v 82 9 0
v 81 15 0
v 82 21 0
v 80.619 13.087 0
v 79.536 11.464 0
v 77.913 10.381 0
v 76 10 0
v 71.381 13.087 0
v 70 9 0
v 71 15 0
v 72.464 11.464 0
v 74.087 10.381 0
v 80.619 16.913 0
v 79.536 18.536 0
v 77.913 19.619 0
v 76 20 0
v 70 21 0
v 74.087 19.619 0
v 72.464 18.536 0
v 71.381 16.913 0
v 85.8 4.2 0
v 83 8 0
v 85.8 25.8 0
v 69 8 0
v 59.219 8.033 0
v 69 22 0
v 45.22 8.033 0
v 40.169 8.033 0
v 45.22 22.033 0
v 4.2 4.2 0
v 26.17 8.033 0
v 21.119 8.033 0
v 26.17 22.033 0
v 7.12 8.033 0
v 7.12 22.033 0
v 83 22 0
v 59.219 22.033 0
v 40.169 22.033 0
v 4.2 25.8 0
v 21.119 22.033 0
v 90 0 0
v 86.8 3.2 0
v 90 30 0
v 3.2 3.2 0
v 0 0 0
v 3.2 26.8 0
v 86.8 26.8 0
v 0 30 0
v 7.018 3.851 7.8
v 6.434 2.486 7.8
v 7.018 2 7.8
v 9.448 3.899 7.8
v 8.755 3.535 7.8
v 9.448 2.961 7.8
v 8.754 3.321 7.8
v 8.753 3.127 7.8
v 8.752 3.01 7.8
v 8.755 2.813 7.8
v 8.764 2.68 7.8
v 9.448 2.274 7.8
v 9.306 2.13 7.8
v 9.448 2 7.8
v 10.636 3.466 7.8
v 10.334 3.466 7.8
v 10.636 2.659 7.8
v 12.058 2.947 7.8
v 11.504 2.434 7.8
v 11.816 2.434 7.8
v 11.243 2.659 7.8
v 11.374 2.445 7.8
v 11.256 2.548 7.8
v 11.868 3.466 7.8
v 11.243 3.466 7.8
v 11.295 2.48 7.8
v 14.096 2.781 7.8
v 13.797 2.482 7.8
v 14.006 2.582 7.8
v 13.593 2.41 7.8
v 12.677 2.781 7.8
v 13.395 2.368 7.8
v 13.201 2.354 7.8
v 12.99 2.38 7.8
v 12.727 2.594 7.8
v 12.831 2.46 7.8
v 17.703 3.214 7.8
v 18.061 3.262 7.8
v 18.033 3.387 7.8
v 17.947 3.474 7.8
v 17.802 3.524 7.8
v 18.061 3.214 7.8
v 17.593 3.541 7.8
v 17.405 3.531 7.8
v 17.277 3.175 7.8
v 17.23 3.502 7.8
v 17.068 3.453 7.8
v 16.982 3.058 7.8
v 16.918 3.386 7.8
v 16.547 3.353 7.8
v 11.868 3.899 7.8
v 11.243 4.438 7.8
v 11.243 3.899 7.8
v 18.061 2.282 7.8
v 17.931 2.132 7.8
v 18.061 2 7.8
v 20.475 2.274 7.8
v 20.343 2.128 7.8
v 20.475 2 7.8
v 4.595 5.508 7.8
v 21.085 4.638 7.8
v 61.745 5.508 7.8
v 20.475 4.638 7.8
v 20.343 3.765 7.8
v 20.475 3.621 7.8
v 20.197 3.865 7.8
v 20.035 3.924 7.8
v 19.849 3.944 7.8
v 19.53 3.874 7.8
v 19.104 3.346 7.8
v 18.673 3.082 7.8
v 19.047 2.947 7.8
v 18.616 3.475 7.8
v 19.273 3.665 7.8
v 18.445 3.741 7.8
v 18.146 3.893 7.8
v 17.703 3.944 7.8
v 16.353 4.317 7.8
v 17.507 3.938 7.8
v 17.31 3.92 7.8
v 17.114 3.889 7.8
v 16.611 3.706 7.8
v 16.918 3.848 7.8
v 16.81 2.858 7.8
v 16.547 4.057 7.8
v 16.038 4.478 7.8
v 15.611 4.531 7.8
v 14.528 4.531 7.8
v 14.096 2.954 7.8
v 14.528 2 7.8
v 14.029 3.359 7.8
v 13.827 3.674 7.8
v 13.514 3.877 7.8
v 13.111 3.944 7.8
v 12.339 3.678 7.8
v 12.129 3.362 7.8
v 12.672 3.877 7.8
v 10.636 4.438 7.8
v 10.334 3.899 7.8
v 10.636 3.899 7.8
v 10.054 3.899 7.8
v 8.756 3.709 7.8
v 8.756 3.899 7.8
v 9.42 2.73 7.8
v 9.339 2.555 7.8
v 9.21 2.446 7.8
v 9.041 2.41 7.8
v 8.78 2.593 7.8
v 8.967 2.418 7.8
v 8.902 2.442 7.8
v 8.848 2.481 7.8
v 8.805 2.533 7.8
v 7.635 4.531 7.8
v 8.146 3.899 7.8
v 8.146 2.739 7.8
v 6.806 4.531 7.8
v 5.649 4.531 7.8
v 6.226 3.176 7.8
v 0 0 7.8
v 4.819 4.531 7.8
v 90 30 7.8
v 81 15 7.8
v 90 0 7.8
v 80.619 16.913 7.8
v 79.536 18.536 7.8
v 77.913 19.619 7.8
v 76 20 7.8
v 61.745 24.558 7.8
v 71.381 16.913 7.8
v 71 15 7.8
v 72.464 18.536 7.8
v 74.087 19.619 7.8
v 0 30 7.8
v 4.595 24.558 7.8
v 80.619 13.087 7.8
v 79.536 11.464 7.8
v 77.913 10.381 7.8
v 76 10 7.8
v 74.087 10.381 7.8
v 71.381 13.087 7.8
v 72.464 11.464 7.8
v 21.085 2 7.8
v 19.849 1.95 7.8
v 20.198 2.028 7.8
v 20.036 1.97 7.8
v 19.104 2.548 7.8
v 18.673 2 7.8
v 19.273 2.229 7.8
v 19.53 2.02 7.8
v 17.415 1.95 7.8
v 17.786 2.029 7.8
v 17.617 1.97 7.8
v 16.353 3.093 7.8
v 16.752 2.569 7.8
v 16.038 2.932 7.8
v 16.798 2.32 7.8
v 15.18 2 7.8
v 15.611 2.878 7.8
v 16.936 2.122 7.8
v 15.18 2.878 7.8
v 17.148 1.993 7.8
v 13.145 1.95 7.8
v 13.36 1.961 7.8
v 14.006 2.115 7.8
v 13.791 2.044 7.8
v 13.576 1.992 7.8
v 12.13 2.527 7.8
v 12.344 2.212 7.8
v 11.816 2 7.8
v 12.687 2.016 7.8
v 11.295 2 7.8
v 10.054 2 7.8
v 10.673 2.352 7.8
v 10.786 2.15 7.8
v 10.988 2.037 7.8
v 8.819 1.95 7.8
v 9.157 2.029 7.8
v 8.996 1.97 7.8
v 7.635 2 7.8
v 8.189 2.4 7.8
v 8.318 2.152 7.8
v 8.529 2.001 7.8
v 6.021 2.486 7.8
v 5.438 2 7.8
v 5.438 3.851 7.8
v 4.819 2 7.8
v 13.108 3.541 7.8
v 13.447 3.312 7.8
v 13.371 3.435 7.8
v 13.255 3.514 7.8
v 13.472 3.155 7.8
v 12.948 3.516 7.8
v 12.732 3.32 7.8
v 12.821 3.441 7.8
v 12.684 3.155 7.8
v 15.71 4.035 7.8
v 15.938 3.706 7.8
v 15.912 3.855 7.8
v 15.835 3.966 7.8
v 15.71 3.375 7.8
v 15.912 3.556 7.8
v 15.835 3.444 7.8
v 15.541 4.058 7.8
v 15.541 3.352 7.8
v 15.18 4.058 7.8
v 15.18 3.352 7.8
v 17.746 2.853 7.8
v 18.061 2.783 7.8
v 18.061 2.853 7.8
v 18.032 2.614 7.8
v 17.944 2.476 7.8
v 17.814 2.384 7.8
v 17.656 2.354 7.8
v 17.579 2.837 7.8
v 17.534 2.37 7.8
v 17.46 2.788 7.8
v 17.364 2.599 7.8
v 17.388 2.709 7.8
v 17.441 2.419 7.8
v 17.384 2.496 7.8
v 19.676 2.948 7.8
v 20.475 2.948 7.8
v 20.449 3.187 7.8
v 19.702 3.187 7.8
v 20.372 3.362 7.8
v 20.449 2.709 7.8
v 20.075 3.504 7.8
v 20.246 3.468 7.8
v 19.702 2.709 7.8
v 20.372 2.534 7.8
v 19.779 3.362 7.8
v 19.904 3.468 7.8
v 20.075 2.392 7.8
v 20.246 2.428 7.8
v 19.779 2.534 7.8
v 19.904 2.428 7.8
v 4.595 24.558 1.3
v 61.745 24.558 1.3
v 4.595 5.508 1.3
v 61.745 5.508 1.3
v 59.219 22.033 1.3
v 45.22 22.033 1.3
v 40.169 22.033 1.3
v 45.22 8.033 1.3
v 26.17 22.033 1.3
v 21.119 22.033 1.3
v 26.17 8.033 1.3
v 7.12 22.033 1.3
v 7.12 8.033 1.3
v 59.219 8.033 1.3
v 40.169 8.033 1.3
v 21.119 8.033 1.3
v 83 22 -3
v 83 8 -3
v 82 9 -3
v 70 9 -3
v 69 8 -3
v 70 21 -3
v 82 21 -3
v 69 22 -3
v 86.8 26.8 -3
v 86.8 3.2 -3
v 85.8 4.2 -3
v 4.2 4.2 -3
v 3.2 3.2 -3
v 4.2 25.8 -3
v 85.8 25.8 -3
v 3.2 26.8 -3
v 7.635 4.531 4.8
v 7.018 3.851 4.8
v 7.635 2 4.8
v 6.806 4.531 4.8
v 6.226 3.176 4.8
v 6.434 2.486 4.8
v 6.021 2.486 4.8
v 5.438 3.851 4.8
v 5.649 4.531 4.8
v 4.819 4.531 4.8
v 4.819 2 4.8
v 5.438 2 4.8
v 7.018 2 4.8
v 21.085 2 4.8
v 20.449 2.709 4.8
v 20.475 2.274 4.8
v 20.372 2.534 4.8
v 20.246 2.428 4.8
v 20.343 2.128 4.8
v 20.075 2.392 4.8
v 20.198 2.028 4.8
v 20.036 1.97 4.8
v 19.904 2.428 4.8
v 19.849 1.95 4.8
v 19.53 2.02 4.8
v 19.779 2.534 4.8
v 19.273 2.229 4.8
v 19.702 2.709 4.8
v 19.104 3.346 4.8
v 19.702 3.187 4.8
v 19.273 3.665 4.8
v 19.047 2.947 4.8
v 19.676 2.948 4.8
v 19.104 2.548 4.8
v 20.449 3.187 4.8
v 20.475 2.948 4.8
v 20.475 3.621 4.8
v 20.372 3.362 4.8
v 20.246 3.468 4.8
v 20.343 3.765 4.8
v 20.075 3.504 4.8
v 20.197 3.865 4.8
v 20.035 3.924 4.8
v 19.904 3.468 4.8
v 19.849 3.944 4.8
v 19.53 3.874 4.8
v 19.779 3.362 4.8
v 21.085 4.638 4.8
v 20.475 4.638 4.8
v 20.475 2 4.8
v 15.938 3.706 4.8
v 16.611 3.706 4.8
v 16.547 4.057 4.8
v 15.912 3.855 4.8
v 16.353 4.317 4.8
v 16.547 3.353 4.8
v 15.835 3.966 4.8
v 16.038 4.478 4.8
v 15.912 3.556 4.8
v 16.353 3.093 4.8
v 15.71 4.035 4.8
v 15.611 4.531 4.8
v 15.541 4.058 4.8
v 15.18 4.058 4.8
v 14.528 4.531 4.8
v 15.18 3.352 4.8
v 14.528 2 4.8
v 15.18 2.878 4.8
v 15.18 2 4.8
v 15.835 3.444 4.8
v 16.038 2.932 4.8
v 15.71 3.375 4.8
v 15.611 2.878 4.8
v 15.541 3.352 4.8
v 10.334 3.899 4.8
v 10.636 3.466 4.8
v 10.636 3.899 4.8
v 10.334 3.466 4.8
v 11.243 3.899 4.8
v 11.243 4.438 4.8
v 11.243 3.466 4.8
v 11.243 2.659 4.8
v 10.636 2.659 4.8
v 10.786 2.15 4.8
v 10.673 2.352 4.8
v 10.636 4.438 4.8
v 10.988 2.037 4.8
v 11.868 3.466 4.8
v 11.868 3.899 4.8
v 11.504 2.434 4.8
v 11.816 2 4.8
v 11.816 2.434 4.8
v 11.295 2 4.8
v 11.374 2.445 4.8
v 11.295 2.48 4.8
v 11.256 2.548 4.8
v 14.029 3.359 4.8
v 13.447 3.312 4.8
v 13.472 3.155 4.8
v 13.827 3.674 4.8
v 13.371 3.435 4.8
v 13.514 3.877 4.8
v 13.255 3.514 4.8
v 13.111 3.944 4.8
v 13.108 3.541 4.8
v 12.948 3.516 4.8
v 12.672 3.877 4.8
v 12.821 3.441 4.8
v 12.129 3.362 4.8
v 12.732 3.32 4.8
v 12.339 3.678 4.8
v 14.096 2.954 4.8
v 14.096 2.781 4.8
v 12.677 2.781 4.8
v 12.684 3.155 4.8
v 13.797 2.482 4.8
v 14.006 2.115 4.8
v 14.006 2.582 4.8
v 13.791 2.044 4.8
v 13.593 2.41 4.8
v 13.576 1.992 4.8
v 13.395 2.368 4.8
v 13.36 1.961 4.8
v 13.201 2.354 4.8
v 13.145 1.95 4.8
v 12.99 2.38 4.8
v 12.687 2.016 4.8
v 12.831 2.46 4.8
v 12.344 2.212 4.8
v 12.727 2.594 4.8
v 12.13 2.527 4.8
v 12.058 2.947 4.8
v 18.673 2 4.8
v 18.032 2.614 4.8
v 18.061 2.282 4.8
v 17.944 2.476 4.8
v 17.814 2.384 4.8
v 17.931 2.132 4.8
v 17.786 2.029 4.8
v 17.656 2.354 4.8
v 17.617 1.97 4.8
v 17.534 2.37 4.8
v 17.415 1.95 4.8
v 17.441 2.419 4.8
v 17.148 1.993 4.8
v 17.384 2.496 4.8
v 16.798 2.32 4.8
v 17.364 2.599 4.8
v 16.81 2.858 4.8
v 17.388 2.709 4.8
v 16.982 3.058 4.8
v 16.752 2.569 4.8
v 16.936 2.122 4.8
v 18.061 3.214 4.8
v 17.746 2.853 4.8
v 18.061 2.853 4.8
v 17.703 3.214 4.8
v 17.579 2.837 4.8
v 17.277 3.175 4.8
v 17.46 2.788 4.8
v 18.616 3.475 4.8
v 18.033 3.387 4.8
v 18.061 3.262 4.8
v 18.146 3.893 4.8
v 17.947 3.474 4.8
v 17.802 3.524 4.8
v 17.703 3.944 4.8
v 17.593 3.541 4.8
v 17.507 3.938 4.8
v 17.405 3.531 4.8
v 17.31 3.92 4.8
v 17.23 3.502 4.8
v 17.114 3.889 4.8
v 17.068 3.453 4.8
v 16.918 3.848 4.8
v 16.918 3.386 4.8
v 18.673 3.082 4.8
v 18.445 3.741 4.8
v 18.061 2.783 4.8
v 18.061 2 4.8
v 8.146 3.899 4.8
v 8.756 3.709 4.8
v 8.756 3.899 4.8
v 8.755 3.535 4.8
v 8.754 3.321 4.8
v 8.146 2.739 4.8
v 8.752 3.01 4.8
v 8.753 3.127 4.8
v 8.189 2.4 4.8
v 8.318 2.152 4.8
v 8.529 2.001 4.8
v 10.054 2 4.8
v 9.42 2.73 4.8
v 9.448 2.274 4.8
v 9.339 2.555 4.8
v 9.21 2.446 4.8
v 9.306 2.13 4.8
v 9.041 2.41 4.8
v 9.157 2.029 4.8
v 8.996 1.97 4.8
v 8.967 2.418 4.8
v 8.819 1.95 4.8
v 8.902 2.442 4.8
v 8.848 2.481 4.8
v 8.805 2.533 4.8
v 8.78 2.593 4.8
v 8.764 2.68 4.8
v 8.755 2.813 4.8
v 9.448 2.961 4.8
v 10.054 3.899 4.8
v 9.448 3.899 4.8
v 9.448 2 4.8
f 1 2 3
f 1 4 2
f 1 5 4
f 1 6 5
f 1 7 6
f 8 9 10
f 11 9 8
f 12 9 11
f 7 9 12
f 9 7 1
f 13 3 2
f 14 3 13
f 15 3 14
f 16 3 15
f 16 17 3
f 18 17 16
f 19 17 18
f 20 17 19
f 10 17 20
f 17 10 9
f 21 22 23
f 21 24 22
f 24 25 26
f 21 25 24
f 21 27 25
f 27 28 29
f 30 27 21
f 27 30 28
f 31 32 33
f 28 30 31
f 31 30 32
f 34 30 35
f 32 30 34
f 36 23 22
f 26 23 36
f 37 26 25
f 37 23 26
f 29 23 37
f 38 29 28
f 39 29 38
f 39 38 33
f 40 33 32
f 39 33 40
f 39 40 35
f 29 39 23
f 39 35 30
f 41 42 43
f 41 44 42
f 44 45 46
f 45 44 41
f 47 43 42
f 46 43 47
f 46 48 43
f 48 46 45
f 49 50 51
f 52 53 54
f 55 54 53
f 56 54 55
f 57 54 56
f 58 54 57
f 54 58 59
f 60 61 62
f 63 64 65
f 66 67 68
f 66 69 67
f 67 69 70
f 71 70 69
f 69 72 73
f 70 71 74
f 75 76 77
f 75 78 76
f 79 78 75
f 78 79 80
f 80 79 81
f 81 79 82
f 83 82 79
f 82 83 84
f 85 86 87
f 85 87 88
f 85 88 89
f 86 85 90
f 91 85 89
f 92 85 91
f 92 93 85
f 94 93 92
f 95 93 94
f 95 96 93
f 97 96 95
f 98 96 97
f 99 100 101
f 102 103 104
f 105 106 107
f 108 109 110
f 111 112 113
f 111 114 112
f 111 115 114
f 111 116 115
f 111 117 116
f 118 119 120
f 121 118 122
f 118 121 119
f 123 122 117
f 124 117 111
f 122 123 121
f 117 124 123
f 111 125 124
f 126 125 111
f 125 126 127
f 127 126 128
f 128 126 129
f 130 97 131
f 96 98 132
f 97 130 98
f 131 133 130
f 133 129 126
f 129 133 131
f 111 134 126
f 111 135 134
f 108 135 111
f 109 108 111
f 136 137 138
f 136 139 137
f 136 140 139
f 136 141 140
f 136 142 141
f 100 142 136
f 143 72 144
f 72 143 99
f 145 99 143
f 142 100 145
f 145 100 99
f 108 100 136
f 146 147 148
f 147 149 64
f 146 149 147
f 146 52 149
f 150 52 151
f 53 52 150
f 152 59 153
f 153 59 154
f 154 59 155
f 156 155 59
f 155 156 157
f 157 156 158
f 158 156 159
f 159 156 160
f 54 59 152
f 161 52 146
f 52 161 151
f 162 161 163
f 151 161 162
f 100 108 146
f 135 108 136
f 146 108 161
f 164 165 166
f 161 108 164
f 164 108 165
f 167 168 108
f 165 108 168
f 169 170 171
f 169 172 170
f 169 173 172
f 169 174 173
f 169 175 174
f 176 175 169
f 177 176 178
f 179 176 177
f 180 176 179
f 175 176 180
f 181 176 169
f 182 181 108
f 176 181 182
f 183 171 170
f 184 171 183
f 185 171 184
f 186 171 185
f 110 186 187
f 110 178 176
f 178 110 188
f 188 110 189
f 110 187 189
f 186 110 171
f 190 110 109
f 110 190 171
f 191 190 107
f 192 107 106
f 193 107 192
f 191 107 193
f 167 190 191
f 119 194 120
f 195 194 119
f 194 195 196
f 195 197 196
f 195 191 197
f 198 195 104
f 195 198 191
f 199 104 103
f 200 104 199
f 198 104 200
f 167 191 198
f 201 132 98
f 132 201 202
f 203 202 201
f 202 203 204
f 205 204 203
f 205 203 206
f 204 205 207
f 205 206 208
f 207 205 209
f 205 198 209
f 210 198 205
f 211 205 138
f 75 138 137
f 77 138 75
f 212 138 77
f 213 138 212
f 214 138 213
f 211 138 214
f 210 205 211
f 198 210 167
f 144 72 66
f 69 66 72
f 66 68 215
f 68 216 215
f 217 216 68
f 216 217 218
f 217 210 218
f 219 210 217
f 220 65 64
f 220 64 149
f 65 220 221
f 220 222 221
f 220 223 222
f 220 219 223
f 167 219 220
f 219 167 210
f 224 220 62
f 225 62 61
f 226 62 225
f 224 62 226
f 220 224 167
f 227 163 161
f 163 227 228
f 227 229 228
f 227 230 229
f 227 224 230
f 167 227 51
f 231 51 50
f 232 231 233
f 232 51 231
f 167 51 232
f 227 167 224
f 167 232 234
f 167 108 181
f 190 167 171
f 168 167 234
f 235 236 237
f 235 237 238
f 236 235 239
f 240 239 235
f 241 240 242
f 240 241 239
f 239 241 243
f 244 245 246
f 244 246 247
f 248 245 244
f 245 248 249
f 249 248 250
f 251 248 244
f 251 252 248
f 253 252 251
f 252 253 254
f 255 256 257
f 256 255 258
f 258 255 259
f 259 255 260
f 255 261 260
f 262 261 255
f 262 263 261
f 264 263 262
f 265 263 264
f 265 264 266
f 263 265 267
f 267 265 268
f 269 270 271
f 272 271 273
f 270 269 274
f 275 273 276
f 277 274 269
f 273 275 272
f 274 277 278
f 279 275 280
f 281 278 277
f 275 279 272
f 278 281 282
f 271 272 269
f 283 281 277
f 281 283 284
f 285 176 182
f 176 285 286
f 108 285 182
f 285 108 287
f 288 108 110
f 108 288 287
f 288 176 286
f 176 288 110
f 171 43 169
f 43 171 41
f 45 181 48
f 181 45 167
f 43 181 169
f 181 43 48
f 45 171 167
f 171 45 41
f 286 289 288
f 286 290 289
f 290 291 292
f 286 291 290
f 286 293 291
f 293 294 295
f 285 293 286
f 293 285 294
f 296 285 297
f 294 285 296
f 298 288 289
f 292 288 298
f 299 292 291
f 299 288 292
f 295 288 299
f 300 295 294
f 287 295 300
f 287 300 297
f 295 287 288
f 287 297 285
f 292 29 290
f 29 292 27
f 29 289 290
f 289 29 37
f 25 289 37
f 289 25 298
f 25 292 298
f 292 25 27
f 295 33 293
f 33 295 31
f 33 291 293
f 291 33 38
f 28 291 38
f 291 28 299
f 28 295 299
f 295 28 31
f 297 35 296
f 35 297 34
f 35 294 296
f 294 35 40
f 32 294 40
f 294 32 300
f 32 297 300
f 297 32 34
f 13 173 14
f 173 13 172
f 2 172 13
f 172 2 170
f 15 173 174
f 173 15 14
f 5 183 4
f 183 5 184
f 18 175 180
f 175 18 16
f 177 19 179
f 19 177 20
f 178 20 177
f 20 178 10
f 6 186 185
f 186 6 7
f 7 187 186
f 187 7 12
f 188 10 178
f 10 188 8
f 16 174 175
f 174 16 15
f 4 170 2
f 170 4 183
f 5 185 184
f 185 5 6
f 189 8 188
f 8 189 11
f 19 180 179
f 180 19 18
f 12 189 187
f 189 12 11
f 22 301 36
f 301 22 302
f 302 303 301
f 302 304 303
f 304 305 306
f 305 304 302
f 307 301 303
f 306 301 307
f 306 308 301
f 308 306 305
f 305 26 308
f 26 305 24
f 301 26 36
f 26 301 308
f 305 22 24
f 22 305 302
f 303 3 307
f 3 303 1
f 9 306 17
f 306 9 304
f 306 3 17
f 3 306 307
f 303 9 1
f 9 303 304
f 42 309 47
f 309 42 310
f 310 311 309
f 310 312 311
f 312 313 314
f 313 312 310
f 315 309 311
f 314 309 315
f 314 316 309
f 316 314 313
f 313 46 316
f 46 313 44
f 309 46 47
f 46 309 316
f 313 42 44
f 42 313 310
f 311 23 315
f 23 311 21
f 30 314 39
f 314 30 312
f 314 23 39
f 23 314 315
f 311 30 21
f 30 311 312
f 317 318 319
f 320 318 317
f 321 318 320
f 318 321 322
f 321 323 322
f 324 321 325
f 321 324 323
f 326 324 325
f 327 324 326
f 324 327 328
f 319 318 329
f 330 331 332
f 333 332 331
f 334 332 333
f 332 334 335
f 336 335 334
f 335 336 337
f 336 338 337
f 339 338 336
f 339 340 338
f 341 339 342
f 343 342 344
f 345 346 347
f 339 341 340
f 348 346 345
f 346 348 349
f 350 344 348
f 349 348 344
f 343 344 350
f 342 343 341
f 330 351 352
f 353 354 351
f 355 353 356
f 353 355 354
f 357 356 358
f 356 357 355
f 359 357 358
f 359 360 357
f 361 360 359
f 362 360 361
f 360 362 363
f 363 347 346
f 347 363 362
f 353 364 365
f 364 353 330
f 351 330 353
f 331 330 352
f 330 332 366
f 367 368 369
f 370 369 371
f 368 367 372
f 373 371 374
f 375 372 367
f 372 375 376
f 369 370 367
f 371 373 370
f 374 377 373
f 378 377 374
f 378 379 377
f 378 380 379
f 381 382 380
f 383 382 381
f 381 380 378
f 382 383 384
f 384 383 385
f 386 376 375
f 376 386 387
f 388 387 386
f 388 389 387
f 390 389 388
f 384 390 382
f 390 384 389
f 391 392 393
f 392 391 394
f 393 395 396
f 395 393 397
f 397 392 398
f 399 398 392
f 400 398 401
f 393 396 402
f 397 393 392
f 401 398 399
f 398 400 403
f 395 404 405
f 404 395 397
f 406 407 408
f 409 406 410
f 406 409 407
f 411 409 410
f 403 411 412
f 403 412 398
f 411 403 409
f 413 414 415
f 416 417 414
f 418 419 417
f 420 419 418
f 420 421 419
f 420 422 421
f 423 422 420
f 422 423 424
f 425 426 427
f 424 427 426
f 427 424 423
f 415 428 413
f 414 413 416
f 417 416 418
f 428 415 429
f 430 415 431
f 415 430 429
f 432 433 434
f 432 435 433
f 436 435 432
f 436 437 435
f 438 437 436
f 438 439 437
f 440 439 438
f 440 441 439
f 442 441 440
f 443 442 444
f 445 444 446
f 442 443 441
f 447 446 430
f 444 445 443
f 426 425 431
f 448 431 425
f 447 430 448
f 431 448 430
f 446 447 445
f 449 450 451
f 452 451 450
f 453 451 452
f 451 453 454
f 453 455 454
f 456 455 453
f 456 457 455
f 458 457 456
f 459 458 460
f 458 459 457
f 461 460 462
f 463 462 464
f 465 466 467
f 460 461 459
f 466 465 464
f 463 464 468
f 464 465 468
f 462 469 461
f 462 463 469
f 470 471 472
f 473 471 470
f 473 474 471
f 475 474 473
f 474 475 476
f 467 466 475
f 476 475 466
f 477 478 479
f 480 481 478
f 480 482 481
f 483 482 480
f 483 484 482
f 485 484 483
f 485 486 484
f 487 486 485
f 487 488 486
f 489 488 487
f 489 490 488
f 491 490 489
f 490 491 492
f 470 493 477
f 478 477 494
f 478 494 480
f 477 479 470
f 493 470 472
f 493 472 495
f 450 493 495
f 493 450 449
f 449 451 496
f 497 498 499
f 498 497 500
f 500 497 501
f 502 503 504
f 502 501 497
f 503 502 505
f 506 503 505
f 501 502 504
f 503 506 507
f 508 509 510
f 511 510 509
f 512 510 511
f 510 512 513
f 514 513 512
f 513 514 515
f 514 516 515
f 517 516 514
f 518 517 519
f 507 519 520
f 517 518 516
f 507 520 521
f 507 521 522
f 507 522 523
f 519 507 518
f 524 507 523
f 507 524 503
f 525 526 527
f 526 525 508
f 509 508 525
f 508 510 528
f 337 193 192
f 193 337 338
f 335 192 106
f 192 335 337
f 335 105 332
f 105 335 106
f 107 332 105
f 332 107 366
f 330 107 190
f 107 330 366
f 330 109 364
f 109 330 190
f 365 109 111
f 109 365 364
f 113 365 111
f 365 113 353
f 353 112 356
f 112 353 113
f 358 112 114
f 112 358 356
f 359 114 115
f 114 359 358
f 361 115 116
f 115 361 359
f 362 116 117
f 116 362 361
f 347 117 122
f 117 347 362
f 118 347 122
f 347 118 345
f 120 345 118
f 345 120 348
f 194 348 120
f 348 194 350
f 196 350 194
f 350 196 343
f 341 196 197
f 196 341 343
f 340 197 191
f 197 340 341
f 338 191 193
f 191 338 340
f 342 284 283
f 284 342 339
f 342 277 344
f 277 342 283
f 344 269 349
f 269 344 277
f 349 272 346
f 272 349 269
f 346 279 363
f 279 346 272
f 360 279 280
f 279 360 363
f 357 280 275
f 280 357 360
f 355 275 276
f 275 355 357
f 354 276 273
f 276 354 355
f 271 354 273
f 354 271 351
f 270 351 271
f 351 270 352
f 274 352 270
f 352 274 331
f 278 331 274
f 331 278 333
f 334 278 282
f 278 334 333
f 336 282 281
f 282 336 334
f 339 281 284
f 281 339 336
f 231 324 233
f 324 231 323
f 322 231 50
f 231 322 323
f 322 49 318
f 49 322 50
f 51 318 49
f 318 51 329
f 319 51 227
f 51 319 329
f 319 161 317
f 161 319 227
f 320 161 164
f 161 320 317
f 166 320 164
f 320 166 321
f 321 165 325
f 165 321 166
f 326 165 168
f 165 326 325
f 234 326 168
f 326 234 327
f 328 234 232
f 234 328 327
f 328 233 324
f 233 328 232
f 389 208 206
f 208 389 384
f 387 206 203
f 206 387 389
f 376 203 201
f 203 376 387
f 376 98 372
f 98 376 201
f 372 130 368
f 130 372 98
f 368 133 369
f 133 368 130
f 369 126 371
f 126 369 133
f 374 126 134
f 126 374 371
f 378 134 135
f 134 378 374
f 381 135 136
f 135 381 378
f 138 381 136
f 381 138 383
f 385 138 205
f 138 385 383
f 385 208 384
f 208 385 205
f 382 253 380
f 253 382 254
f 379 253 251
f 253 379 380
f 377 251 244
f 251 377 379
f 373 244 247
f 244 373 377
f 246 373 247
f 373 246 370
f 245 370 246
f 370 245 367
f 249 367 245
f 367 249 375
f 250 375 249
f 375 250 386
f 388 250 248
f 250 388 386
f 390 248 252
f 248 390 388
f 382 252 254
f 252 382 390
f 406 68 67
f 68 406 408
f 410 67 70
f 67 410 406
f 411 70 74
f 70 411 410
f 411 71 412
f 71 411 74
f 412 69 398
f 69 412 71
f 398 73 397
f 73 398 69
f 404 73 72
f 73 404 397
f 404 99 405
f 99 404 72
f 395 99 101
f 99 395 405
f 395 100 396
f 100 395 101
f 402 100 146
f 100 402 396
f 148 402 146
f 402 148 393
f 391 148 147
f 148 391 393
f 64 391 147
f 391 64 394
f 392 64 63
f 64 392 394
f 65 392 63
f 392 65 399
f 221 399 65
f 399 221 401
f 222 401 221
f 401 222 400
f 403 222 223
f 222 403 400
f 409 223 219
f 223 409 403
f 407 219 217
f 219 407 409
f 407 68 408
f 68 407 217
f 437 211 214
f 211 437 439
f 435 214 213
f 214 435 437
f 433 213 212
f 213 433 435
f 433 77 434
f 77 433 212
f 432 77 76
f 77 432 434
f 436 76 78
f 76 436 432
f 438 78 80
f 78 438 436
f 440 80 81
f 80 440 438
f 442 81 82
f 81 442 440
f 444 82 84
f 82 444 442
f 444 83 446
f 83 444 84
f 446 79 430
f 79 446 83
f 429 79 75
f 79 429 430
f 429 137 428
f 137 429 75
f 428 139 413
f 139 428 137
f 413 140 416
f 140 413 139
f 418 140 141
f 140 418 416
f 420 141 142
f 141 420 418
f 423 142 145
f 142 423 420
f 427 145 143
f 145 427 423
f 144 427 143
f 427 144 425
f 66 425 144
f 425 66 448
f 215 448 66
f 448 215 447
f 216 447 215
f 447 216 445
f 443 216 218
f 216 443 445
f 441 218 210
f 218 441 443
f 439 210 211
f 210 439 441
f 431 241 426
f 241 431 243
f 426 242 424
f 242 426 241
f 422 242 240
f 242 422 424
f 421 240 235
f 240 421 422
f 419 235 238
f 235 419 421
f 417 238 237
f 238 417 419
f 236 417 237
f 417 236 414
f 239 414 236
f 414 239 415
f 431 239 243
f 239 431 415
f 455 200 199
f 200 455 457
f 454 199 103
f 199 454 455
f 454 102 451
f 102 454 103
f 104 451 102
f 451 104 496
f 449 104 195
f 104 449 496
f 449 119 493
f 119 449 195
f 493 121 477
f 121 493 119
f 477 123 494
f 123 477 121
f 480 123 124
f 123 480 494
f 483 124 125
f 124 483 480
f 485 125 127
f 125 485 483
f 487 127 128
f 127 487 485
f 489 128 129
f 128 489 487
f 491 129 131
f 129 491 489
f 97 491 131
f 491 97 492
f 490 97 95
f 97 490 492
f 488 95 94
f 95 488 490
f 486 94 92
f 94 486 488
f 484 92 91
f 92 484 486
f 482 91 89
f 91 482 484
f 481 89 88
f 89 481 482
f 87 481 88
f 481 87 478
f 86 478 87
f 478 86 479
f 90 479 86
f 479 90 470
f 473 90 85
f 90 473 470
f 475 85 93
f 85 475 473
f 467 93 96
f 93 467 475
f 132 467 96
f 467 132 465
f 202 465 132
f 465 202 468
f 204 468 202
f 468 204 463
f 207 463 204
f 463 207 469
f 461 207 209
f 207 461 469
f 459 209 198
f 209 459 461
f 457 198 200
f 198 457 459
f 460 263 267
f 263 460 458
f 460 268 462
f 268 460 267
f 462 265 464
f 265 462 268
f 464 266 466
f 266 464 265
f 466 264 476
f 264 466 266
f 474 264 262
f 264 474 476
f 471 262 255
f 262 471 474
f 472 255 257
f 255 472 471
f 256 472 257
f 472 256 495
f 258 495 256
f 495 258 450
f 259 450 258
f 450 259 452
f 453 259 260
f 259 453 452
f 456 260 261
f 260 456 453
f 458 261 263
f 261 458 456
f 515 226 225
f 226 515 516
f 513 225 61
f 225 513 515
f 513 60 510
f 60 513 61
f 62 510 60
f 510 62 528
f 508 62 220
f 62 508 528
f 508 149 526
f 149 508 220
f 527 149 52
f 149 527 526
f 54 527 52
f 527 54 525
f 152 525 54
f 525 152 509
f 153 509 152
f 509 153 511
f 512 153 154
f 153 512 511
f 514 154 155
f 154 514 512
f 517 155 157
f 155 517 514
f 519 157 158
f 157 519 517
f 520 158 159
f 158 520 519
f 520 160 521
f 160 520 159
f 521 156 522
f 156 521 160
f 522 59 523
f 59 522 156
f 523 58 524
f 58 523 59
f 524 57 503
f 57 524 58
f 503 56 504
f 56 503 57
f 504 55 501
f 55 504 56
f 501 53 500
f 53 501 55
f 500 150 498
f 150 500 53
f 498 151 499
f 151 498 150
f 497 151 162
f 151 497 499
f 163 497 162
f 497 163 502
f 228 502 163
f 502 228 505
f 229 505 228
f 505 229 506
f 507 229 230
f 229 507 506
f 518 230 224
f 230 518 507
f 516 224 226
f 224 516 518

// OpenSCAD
BODY_DEPTH = 3;
SWITCH_DEPTH = 6.5;
PLATE_DEPTH = 1.3;
FRONT_DEPTH = SWITCH_DEPTH + PLATE_DEPTH;
SWITCH_POSITION = [4.5, 5.25, 0];
ENCODER_POSITION = [76, 15, 0];
ENCODER_BODY_SIZE = 12;

// Front
difference() {
    union() {
        difference() {
            union() {
                difference() {
                    cube(size = [90, 30, FRONT_DEPTH]);
                    
                    union() {
                        linear_extrude(height = FRONT_DEPTH)
                            translate(SWITCH_POSITION)
                            import(file = "keyspacing.dxf");
                        translate([4.75, 7, 0])
                            cube(size = [55, 16, FRONT_DEPTH]);
                    }
                }

                linear_extrude(height = PLATE_DEPTH)
                            translate(SWITCH_POSITION)
                            import(file = "keyspacing.dxf");
            }
            translate(ENCODER_POSITION)
                cylinder(10, 5, 5);
        }

        // Encoder holder
        translate([ENCODER_POSITION[0], ENCODER_POSITION[1], -1.5])
            difference() {
                cube(size = [ENCODER_BODY_SIZE + 2, ENCODER_BODY_SIZE + 2, 3], center = true);
                cube(size = [ENCODER_BODY_SIZE, ENCODER_BODY_SIZE, 3], center = true);
            }
            
        // Catch (For glueing in place to body)
        CATCH_OFFSET = BODY_DEPTH + 0.2;      
        translate([CATCH_OFFSET, CATCH_OFFSET, -3])
            difference() {
                cube(size = [90 - (CATCH_OFFSET * 2), 30 - (CATCH_OFFSET * 2), 3]);
                translate([1, 1, 0])
                    cube(size = [88 - (CATCH_OFFSET * 2), 28 - (CATCH_OFFSET * 2), 3]);
            }
    }
    // Mutepad text
    translate([4.5, 2, FRONT_DEPTH - 3])
        linear_extrude(20)
        text("MutePad", size = 2.5, font = "tahoma:style=bold");
}
